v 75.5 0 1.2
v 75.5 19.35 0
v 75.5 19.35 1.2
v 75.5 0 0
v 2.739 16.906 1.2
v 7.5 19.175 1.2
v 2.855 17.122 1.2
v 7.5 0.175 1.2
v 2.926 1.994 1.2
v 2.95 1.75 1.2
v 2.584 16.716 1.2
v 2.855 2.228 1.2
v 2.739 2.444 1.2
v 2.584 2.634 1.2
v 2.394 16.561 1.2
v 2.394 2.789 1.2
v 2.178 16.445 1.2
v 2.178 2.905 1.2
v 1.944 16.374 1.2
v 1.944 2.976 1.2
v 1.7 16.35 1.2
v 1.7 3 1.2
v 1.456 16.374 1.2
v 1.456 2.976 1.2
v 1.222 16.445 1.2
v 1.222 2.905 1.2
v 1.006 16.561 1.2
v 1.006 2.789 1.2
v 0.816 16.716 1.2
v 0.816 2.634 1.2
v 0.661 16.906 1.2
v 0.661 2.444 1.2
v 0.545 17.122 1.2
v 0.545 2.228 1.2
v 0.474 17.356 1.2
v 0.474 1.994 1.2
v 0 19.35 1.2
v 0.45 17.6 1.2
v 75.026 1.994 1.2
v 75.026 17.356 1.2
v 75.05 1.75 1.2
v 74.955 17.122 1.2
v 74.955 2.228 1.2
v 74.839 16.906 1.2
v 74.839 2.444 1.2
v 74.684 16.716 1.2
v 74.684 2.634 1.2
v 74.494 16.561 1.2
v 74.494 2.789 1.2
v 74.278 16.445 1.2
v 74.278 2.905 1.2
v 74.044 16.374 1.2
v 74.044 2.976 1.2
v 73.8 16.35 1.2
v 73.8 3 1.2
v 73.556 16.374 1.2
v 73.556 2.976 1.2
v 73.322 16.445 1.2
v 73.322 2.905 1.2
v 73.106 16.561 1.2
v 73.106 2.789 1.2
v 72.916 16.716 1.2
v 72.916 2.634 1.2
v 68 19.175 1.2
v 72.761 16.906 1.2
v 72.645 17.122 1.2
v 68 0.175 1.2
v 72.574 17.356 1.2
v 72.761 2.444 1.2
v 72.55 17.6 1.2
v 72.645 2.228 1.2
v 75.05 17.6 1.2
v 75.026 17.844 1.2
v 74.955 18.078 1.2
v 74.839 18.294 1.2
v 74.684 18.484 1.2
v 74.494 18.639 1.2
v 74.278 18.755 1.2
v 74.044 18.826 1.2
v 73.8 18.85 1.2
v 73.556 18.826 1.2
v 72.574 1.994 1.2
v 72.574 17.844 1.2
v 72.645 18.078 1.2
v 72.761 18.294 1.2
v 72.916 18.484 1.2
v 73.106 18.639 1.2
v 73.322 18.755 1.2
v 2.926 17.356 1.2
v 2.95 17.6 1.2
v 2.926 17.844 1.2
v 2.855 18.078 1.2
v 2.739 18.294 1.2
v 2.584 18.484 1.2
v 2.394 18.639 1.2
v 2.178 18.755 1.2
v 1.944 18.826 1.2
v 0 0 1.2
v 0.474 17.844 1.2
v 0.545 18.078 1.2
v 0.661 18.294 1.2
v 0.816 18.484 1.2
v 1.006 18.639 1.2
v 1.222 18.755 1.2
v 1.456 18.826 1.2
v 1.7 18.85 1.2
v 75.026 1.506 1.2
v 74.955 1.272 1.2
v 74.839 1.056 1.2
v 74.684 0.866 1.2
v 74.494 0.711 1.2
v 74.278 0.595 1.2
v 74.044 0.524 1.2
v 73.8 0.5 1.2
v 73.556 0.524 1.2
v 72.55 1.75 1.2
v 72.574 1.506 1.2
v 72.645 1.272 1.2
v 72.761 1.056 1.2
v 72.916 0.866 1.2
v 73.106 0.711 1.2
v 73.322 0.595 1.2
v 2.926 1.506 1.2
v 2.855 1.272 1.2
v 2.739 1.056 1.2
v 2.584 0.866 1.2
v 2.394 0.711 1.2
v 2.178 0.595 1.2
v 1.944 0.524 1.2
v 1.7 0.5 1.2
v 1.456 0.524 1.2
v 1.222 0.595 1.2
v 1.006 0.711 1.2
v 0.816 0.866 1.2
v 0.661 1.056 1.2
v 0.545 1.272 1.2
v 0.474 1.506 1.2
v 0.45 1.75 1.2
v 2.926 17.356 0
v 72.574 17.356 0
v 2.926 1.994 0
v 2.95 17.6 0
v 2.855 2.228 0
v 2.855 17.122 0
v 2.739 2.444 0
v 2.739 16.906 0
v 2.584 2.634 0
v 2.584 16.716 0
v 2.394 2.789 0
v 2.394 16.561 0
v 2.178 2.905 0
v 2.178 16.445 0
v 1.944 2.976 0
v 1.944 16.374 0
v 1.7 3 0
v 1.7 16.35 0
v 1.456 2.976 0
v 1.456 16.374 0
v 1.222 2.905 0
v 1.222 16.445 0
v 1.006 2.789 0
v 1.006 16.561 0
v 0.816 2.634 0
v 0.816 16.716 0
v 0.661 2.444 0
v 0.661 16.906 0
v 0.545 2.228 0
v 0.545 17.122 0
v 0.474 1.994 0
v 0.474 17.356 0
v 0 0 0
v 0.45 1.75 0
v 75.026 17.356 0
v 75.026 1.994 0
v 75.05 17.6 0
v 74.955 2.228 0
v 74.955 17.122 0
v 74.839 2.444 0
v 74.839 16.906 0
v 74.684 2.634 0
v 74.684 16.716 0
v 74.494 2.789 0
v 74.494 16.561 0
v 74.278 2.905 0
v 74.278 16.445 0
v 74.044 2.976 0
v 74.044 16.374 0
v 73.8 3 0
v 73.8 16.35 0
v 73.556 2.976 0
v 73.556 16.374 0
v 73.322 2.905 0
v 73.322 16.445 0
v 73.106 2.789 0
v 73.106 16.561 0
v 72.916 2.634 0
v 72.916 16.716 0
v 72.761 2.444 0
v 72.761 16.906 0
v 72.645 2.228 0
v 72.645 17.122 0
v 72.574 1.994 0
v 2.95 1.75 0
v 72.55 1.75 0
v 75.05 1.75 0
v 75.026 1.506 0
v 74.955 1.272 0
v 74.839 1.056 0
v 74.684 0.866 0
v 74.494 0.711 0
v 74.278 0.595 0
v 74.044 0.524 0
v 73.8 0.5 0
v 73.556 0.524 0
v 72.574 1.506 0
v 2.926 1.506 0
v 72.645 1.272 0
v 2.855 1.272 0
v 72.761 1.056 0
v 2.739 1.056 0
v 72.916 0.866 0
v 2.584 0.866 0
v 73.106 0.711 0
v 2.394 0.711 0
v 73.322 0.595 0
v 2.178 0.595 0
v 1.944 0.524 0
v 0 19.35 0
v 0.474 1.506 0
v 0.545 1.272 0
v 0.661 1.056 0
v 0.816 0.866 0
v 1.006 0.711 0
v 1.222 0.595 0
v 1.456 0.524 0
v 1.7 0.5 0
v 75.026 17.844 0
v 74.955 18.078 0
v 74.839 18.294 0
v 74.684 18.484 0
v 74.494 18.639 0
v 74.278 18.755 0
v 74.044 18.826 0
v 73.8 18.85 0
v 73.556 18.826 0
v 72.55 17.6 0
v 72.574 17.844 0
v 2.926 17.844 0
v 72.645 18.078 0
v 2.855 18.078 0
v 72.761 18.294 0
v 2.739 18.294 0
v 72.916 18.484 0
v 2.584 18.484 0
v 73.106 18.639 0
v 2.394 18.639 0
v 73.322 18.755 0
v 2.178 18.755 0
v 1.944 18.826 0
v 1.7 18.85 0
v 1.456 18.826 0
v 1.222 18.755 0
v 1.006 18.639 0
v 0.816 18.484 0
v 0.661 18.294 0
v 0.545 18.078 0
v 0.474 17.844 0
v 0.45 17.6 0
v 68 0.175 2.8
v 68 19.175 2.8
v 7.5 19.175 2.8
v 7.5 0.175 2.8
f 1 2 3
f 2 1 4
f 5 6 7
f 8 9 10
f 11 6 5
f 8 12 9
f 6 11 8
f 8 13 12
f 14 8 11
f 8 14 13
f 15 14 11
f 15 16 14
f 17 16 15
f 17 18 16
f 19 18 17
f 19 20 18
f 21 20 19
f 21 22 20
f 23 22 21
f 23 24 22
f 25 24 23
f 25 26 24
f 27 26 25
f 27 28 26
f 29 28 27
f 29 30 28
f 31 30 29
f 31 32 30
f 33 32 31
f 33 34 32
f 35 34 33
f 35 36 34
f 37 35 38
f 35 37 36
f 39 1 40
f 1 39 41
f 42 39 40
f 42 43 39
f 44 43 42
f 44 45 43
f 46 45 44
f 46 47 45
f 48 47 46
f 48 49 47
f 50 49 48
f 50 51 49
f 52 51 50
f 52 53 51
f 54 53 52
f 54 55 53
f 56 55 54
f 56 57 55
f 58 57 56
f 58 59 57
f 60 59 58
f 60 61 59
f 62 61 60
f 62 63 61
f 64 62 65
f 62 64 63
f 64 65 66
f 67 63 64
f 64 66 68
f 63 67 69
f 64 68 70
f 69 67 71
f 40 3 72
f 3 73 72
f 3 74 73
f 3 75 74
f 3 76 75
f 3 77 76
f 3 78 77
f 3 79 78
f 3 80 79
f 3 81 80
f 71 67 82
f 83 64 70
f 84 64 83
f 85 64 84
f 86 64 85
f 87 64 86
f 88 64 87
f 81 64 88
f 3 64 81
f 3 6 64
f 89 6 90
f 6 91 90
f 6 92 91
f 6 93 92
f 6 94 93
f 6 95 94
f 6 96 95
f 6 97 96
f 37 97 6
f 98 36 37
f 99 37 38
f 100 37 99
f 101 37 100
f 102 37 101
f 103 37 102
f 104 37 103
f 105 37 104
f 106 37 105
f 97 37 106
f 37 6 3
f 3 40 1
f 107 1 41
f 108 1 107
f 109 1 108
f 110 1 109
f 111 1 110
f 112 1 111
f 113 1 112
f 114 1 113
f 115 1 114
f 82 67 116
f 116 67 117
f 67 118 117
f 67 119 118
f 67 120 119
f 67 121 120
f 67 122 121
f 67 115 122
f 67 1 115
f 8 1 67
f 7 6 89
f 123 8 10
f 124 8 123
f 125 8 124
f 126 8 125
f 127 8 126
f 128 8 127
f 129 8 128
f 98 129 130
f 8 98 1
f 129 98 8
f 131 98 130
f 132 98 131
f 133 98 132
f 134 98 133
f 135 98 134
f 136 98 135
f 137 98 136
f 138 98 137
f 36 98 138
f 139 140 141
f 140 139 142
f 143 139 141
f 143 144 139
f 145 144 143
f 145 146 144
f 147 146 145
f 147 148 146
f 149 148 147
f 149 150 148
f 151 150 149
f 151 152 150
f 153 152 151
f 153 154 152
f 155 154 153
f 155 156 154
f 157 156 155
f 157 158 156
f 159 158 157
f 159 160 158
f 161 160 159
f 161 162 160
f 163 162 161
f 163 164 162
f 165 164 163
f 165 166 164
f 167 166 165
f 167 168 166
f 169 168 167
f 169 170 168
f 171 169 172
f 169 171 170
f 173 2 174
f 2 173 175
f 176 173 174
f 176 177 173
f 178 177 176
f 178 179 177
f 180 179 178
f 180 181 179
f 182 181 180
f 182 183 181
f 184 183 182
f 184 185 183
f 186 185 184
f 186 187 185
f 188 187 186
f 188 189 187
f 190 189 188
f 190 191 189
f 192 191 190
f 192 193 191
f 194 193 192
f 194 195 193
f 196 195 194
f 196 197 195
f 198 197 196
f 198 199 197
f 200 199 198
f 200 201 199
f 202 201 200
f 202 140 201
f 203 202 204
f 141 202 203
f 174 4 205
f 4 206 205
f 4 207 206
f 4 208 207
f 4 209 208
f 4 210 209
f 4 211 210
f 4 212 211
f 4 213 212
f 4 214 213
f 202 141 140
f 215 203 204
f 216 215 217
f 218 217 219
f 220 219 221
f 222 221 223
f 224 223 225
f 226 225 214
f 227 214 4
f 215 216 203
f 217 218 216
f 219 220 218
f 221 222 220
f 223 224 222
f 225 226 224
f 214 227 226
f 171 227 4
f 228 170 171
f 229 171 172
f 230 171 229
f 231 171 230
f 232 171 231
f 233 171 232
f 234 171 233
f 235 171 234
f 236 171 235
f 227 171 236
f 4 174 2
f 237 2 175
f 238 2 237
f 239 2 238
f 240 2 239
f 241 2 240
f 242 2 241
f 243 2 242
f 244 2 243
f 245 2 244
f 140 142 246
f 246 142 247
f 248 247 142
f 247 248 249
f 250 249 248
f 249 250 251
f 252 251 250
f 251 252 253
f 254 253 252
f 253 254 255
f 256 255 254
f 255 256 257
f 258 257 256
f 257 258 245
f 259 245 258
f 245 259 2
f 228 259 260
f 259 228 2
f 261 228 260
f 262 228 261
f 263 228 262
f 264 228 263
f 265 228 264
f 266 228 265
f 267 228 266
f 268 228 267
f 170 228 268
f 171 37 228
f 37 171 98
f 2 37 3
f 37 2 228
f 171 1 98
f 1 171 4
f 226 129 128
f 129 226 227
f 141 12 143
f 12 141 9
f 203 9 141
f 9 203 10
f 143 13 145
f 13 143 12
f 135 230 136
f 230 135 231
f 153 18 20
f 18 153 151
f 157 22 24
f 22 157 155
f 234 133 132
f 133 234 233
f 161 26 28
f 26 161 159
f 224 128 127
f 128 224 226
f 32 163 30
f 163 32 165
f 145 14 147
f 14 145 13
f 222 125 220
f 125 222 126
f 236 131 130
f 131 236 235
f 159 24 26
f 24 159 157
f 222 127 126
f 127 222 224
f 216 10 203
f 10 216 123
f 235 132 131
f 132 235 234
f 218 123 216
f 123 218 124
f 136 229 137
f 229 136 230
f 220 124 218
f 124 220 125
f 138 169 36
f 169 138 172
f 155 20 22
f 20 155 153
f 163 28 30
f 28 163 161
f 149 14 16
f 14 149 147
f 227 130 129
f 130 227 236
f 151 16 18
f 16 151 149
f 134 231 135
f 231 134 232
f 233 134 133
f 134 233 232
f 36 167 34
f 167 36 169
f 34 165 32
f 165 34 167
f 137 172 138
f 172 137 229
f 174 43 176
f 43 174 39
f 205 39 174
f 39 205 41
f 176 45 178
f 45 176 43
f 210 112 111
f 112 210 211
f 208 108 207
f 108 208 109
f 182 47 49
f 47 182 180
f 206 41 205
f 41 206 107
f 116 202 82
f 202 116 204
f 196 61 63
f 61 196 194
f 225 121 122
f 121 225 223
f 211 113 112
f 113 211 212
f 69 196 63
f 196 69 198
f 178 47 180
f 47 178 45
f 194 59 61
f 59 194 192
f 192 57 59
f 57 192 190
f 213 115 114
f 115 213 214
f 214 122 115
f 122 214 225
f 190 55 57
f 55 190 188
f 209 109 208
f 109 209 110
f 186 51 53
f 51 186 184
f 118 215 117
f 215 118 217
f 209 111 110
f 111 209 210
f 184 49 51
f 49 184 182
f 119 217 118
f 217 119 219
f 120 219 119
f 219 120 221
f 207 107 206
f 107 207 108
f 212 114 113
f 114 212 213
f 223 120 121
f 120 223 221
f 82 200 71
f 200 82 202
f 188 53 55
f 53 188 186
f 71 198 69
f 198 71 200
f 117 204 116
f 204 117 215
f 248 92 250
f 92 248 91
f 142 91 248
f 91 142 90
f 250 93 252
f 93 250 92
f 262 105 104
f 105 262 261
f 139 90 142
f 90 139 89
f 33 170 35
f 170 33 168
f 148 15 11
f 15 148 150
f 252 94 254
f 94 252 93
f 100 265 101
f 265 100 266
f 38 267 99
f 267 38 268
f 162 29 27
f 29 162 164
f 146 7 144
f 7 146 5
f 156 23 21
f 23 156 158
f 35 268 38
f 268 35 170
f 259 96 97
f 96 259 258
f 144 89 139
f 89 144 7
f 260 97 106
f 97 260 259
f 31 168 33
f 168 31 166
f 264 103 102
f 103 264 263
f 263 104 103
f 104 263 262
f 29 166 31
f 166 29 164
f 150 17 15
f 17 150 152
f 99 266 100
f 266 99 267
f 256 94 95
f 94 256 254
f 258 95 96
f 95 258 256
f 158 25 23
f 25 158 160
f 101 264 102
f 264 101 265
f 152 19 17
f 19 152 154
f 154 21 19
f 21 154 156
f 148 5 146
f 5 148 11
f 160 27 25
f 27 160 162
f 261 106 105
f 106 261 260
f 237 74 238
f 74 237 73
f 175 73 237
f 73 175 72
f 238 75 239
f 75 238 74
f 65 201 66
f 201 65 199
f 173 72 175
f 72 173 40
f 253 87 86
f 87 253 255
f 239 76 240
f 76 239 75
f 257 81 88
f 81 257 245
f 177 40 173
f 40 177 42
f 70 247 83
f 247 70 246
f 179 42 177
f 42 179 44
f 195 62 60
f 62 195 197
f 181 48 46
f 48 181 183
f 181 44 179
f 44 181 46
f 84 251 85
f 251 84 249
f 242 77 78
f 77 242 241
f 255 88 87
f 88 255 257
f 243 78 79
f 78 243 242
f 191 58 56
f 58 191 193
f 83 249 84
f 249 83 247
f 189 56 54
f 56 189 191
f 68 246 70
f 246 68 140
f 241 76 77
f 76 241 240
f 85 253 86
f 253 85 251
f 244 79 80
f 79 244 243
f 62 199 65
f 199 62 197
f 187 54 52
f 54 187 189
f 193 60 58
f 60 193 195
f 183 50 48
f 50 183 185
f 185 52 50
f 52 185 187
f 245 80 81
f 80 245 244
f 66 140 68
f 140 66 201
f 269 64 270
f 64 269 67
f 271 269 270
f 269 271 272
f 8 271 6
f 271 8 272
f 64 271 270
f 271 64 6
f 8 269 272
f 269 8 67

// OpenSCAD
$fn = 32;

pcb_w = 75.5;
pcb_h = 19.35;
pcb_d = 1.2;

bezel_w = 60.5;
bezel_h = 19;
bezel_d = 1.6;
bezel_offset_x = (pcb_w - bezel_w) / 2;
bezel_offset_y = (pcb_h - bezel_h) / 2;
bezel_offset_z = pcb_d;

va_w = 53.18;
va_h = 14.78;
va_d = bezel_d;
va_offset_x = ((bezel_w - va_w) / 2) + bezel_offset_x;
va_offset_y = ((bezel_h - va_h) / 2) + bezel_offset_y;
va_offset_z = bezel_offset_z;

aa_w = 51.18;
aa_h = 12.78;
aa_d = va_d;
aa_offset_x = ((va_w - aa_w) / 2) + va_offset_x;
aa_offset_y = ((va_h - aa_h) / 2) + va_offset_y;
aa_offset_z = va_offset_z;

mount_hole_d = 2.5;
mount_hole_offset_x = 1.7;
mount_hole_offset_y = 1.75;

union() {
  difference() {
    translate([0,0,0])
      color("#143324")
        cube([pcb_w, pcb_h, pcb_d]);
   
    translate([mount_hole_offset_x, mount_hole_offset_y, 0])
      cylinder(pcb_d, d = mount_hole_d);
    
    translate([pcb_w - mount_hole_offset_x, mount_hole_offset_y, 0])
      cylinder(pcb_d, d = mount_hole_d);
    
    translate([mount_hole_offset_x, pcb_h - mount_hole_offset_y, 0])
      cylinder(pcb_d, d = mount_hole_d);
      
    translate([pcb_w - mount_hole_offset_x, pcb_h - mount_hole_offset_y, 0])
      cylinder(pcb_d, d = mount_hole_d);
  }
  
  difference() {
    translate([bezel_offset_x, bezel_offset_y, bezel_offset_z])
      color("#080808")
        cube([bezel_w, bezel_h, bezel_d]);
  
    translate([va_offset_x, va_offset_y, va_offset_z])
      cube([va_w, va_h, va_d]);
  }
  
  difference() {
    translate([va_offset_x, va_offset_y, va_offset_z])
      color("#B7B7B7")
        cube([va_w, va_h, va_d]);
  
    translate([aa_offset_x, aa_offset_y, aa_offset_z])
      cube([aa_w, aa_h, aa_d]);
  }
  
  color("#C0C0C0")
    translate([aa_offset_x, aa_offset_y, aa_offset_z])
      cube([aa_w, aa_h, aa_d]);
}
